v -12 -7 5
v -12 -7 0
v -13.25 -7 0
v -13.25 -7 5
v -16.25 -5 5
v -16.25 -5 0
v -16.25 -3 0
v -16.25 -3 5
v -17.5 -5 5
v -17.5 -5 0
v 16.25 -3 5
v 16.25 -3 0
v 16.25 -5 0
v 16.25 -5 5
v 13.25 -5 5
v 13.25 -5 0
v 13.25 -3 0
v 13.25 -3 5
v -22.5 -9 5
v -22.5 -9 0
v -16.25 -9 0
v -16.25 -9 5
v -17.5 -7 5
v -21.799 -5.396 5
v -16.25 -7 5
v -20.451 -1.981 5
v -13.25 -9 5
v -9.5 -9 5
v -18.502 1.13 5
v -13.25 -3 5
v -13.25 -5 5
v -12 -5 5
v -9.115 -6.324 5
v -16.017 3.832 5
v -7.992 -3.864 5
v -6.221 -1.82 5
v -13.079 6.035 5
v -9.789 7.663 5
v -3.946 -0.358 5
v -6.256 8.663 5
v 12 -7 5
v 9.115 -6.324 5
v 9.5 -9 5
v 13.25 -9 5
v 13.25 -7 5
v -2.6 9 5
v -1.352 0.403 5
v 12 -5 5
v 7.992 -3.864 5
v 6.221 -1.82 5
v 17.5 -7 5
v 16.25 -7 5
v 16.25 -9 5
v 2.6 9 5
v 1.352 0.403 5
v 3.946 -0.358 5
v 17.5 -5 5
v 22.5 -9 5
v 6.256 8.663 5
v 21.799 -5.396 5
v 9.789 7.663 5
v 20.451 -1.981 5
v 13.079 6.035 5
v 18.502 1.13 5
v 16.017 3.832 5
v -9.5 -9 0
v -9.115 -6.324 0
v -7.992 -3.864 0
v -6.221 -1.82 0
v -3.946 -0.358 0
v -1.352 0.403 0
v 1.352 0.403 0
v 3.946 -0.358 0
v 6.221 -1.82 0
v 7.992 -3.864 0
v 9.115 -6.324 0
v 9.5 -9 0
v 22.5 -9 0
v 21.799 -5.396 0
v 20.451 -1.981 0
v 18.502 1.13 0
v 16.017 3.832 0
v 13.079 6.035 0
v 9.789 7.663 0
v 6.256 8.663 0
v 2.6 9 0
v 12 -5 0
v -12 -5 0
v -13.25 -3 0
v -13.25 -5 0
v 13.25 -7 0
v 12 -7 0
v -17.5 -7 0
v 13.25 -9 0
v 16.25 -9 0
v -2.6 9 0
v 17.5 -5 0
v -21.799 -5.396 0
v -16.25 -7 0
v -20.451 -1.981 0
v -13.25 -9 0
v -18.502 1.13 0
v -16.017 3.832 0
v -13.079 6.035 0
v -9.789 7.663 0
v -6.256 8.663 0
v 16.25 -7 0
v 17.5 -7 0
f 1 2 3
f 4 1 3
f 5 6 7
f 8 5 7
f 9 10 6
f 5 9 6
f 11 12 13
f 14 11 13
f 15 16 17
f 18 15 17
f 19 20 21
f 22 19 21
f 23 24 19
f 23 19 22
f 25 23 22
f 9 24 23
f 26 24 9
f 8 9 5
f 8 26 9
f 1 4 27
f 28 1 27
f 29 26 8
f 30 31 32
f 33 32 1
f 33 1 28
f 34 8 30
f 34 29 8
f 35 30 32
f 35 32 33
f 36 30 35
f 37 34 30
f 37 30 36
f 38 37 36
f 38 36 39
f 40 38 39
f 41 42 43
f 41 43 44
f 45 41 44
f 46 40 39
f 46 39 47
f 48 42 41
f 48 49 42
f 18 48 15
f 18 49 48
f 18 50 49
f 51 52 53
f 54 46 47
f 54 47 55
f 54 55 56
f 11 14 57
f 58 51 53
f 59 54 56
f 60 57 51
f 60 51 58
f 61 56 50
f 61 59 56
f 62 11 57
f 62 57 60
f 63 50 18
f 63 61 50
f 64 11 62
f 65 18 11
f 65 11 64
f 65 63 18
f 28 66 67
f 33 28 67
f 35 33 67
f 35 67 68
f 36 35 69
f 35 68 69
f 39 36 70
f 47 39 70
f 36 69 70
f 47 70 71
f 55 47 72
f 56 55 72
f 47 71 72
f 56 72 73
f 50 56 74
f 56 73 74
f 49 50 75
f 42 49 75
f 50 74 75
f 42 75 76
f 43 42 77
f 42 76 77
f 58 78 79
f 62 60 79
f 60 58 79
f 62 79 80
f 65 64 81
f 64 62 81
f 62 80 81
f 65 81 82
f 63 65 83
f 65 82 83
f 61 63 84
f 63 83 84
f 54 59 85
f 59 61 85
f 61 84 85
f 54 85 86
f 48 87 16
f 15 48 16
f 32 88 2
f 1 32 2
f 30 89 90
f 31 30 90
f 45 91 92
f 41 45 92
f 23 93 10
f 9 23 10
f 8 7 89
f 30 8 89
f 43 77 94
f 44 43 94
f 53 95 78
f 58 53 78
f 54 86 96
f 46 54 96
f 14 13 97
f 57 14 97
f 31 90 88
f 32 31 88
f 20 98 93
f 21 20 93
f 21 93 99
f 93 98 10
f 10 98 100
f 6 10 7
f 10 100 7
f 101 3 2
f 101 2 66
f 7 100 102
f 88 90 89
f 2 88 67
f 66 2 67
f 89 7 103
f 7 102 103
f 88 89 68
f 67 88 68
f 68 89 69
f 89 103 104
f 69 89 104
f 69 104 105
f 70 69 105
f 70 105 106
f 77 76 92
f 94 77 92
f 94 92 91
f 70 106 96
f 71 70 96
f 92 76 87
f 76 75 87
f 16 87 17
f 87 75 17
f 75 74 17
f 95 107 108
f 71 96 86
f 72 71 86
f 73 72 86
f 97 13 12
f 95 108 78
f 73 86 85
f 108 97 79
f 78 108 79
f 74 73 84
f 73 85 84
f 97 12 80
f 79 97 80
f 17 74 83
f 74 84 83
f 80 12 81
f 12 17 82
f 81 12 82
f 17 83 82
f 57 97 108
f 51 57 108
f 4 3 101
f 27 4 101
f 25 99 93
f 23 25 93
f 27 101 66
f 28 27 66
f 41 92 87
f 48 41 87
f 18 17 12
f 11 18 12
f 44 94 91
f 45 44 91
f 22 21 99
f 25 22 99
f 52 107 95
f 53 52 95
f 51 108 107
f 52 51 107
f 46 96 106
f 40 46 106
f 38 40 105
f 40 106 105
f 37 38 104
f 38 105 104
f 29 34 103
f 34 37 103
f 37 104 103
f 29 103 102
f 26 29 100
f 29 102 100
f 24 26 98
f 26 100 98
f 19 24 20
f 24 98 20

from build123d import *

# Parameters (mm, degrees)
BOSS_EXTRUDE1_DEPTH = 5
FILLET1_R           = 20


with BuildPart() as part:
    # Sketch1 → Boss-Extrude1 (new body)
    with BuildSketch(Plane.XY):
        with BuildLine():
            Line((13.25, -3), (16.25, -3))
            Line((16.25, -3), (16.25, -5))
            Line((16.25, -5), (17.5, -5))
            Line((17.5, -5), (17.5, -7))
            Line((17.5, -7), (16.25, -7))
            Line((16.25, -7), (16.25, -9))
            Line((16.25, -9), (22.5, -9))
            Line((22.5, -9), (22.5, 9))
            Line((22.5, 9), (-22.5, 9))
            Line((-22.5, 9), (-22.5, -9))
            Line((-22.5, -9), (-16.25, -9))
            Line((-16.25, -9), (-16.25, -7))
            Line((-16.25, -7), (-17.5, -7))
            Line((-17.5, -7), (-17.5, -5))
            Line((-17.5, -5), (-16.25, -5))
            Line((-16.25, -5), (-16.25, -3))
            Line((-16.25, -3), (-13.25, -3))
            Line((-13.25, -3), (-13.25, -5))
            Line((-13.25, -5), (-12, -5))
            Line((-12, -5), (-12, -7))
            Line((-12, -7), (-13.25, -7))
            Line((-13.25, -7), (-13.25, -9))
            Line((-13.25, -9), (-9.5, -9))
            ThreePointArc((-9.5, -9), (0, 0.5), (9.5, -9))
            Line((9.5, -9), (13.25, -9))
            Line((13.25, -9), (13.25, -7))
            Line((13.25, -7), (12, -7))
            Line((12, -7), (12, -5))
            Line((12, -5), (13.25, -5))
            Line((13.25, -5), (13.25, -3))
        make_face()
    extrude(amount=BOSS_EXTRUDE1_DEPTH)

    # Fillet1
    # the kernel refuses this fillet: 20 mm, written as the material it takes off along each edge
    with BuildSketch(Plane(origin=(22.5, 9, -49.749371855), x_dir=(0, -1, 0), z_dir=(0, 0, 1))) as fillet1_piece_1:
        with BuildLine():
            CenterArc((20, -19.899748742), FILLET1_R, 95.739170477, 84.260829523)
            Line((0, -19.899748742), (-0.4, -19.899748742))
            Line((-0.4, -19.899748742), (-0.4, 0))
            Line((-0.4, 0), (0, 0.4))
            ThreePointArc((0, 0.4), (9, 0.4), (17.96, 0.397994975))
            Line((17.96, 0.397994975), (18, 0))
        make_face()
    extrude(amount=104.498743711, mode=Mode.SUBTRACT)
    with BuildSketch(Plane(origin=(-22.5, 9, -49.749371855), x_dir=(1, 0, 0), z_dir=(0, 0, 1))) as fillet1_piece_2:
        with BuildLine():
            CenterArc((19.899748742, -20), FILLET1_R, 90, 84.260829523)
            Line((0, -18), (-0.397994975, -17.96))
            ThreePointArc((-0.397994975, -17.96), (-0.4, -9), (-0.4, 0))
            Line((-0.4, 0), (0, 0.4))
            Line((0, 0.4), (19.899748742, 0.4))
            Line((19.899748742, 0.4), (19.899748742, 0))
        make_face()
    extrude(amount=104.498743711, mode=Mode.SUBTRACT)


solid = part.part
